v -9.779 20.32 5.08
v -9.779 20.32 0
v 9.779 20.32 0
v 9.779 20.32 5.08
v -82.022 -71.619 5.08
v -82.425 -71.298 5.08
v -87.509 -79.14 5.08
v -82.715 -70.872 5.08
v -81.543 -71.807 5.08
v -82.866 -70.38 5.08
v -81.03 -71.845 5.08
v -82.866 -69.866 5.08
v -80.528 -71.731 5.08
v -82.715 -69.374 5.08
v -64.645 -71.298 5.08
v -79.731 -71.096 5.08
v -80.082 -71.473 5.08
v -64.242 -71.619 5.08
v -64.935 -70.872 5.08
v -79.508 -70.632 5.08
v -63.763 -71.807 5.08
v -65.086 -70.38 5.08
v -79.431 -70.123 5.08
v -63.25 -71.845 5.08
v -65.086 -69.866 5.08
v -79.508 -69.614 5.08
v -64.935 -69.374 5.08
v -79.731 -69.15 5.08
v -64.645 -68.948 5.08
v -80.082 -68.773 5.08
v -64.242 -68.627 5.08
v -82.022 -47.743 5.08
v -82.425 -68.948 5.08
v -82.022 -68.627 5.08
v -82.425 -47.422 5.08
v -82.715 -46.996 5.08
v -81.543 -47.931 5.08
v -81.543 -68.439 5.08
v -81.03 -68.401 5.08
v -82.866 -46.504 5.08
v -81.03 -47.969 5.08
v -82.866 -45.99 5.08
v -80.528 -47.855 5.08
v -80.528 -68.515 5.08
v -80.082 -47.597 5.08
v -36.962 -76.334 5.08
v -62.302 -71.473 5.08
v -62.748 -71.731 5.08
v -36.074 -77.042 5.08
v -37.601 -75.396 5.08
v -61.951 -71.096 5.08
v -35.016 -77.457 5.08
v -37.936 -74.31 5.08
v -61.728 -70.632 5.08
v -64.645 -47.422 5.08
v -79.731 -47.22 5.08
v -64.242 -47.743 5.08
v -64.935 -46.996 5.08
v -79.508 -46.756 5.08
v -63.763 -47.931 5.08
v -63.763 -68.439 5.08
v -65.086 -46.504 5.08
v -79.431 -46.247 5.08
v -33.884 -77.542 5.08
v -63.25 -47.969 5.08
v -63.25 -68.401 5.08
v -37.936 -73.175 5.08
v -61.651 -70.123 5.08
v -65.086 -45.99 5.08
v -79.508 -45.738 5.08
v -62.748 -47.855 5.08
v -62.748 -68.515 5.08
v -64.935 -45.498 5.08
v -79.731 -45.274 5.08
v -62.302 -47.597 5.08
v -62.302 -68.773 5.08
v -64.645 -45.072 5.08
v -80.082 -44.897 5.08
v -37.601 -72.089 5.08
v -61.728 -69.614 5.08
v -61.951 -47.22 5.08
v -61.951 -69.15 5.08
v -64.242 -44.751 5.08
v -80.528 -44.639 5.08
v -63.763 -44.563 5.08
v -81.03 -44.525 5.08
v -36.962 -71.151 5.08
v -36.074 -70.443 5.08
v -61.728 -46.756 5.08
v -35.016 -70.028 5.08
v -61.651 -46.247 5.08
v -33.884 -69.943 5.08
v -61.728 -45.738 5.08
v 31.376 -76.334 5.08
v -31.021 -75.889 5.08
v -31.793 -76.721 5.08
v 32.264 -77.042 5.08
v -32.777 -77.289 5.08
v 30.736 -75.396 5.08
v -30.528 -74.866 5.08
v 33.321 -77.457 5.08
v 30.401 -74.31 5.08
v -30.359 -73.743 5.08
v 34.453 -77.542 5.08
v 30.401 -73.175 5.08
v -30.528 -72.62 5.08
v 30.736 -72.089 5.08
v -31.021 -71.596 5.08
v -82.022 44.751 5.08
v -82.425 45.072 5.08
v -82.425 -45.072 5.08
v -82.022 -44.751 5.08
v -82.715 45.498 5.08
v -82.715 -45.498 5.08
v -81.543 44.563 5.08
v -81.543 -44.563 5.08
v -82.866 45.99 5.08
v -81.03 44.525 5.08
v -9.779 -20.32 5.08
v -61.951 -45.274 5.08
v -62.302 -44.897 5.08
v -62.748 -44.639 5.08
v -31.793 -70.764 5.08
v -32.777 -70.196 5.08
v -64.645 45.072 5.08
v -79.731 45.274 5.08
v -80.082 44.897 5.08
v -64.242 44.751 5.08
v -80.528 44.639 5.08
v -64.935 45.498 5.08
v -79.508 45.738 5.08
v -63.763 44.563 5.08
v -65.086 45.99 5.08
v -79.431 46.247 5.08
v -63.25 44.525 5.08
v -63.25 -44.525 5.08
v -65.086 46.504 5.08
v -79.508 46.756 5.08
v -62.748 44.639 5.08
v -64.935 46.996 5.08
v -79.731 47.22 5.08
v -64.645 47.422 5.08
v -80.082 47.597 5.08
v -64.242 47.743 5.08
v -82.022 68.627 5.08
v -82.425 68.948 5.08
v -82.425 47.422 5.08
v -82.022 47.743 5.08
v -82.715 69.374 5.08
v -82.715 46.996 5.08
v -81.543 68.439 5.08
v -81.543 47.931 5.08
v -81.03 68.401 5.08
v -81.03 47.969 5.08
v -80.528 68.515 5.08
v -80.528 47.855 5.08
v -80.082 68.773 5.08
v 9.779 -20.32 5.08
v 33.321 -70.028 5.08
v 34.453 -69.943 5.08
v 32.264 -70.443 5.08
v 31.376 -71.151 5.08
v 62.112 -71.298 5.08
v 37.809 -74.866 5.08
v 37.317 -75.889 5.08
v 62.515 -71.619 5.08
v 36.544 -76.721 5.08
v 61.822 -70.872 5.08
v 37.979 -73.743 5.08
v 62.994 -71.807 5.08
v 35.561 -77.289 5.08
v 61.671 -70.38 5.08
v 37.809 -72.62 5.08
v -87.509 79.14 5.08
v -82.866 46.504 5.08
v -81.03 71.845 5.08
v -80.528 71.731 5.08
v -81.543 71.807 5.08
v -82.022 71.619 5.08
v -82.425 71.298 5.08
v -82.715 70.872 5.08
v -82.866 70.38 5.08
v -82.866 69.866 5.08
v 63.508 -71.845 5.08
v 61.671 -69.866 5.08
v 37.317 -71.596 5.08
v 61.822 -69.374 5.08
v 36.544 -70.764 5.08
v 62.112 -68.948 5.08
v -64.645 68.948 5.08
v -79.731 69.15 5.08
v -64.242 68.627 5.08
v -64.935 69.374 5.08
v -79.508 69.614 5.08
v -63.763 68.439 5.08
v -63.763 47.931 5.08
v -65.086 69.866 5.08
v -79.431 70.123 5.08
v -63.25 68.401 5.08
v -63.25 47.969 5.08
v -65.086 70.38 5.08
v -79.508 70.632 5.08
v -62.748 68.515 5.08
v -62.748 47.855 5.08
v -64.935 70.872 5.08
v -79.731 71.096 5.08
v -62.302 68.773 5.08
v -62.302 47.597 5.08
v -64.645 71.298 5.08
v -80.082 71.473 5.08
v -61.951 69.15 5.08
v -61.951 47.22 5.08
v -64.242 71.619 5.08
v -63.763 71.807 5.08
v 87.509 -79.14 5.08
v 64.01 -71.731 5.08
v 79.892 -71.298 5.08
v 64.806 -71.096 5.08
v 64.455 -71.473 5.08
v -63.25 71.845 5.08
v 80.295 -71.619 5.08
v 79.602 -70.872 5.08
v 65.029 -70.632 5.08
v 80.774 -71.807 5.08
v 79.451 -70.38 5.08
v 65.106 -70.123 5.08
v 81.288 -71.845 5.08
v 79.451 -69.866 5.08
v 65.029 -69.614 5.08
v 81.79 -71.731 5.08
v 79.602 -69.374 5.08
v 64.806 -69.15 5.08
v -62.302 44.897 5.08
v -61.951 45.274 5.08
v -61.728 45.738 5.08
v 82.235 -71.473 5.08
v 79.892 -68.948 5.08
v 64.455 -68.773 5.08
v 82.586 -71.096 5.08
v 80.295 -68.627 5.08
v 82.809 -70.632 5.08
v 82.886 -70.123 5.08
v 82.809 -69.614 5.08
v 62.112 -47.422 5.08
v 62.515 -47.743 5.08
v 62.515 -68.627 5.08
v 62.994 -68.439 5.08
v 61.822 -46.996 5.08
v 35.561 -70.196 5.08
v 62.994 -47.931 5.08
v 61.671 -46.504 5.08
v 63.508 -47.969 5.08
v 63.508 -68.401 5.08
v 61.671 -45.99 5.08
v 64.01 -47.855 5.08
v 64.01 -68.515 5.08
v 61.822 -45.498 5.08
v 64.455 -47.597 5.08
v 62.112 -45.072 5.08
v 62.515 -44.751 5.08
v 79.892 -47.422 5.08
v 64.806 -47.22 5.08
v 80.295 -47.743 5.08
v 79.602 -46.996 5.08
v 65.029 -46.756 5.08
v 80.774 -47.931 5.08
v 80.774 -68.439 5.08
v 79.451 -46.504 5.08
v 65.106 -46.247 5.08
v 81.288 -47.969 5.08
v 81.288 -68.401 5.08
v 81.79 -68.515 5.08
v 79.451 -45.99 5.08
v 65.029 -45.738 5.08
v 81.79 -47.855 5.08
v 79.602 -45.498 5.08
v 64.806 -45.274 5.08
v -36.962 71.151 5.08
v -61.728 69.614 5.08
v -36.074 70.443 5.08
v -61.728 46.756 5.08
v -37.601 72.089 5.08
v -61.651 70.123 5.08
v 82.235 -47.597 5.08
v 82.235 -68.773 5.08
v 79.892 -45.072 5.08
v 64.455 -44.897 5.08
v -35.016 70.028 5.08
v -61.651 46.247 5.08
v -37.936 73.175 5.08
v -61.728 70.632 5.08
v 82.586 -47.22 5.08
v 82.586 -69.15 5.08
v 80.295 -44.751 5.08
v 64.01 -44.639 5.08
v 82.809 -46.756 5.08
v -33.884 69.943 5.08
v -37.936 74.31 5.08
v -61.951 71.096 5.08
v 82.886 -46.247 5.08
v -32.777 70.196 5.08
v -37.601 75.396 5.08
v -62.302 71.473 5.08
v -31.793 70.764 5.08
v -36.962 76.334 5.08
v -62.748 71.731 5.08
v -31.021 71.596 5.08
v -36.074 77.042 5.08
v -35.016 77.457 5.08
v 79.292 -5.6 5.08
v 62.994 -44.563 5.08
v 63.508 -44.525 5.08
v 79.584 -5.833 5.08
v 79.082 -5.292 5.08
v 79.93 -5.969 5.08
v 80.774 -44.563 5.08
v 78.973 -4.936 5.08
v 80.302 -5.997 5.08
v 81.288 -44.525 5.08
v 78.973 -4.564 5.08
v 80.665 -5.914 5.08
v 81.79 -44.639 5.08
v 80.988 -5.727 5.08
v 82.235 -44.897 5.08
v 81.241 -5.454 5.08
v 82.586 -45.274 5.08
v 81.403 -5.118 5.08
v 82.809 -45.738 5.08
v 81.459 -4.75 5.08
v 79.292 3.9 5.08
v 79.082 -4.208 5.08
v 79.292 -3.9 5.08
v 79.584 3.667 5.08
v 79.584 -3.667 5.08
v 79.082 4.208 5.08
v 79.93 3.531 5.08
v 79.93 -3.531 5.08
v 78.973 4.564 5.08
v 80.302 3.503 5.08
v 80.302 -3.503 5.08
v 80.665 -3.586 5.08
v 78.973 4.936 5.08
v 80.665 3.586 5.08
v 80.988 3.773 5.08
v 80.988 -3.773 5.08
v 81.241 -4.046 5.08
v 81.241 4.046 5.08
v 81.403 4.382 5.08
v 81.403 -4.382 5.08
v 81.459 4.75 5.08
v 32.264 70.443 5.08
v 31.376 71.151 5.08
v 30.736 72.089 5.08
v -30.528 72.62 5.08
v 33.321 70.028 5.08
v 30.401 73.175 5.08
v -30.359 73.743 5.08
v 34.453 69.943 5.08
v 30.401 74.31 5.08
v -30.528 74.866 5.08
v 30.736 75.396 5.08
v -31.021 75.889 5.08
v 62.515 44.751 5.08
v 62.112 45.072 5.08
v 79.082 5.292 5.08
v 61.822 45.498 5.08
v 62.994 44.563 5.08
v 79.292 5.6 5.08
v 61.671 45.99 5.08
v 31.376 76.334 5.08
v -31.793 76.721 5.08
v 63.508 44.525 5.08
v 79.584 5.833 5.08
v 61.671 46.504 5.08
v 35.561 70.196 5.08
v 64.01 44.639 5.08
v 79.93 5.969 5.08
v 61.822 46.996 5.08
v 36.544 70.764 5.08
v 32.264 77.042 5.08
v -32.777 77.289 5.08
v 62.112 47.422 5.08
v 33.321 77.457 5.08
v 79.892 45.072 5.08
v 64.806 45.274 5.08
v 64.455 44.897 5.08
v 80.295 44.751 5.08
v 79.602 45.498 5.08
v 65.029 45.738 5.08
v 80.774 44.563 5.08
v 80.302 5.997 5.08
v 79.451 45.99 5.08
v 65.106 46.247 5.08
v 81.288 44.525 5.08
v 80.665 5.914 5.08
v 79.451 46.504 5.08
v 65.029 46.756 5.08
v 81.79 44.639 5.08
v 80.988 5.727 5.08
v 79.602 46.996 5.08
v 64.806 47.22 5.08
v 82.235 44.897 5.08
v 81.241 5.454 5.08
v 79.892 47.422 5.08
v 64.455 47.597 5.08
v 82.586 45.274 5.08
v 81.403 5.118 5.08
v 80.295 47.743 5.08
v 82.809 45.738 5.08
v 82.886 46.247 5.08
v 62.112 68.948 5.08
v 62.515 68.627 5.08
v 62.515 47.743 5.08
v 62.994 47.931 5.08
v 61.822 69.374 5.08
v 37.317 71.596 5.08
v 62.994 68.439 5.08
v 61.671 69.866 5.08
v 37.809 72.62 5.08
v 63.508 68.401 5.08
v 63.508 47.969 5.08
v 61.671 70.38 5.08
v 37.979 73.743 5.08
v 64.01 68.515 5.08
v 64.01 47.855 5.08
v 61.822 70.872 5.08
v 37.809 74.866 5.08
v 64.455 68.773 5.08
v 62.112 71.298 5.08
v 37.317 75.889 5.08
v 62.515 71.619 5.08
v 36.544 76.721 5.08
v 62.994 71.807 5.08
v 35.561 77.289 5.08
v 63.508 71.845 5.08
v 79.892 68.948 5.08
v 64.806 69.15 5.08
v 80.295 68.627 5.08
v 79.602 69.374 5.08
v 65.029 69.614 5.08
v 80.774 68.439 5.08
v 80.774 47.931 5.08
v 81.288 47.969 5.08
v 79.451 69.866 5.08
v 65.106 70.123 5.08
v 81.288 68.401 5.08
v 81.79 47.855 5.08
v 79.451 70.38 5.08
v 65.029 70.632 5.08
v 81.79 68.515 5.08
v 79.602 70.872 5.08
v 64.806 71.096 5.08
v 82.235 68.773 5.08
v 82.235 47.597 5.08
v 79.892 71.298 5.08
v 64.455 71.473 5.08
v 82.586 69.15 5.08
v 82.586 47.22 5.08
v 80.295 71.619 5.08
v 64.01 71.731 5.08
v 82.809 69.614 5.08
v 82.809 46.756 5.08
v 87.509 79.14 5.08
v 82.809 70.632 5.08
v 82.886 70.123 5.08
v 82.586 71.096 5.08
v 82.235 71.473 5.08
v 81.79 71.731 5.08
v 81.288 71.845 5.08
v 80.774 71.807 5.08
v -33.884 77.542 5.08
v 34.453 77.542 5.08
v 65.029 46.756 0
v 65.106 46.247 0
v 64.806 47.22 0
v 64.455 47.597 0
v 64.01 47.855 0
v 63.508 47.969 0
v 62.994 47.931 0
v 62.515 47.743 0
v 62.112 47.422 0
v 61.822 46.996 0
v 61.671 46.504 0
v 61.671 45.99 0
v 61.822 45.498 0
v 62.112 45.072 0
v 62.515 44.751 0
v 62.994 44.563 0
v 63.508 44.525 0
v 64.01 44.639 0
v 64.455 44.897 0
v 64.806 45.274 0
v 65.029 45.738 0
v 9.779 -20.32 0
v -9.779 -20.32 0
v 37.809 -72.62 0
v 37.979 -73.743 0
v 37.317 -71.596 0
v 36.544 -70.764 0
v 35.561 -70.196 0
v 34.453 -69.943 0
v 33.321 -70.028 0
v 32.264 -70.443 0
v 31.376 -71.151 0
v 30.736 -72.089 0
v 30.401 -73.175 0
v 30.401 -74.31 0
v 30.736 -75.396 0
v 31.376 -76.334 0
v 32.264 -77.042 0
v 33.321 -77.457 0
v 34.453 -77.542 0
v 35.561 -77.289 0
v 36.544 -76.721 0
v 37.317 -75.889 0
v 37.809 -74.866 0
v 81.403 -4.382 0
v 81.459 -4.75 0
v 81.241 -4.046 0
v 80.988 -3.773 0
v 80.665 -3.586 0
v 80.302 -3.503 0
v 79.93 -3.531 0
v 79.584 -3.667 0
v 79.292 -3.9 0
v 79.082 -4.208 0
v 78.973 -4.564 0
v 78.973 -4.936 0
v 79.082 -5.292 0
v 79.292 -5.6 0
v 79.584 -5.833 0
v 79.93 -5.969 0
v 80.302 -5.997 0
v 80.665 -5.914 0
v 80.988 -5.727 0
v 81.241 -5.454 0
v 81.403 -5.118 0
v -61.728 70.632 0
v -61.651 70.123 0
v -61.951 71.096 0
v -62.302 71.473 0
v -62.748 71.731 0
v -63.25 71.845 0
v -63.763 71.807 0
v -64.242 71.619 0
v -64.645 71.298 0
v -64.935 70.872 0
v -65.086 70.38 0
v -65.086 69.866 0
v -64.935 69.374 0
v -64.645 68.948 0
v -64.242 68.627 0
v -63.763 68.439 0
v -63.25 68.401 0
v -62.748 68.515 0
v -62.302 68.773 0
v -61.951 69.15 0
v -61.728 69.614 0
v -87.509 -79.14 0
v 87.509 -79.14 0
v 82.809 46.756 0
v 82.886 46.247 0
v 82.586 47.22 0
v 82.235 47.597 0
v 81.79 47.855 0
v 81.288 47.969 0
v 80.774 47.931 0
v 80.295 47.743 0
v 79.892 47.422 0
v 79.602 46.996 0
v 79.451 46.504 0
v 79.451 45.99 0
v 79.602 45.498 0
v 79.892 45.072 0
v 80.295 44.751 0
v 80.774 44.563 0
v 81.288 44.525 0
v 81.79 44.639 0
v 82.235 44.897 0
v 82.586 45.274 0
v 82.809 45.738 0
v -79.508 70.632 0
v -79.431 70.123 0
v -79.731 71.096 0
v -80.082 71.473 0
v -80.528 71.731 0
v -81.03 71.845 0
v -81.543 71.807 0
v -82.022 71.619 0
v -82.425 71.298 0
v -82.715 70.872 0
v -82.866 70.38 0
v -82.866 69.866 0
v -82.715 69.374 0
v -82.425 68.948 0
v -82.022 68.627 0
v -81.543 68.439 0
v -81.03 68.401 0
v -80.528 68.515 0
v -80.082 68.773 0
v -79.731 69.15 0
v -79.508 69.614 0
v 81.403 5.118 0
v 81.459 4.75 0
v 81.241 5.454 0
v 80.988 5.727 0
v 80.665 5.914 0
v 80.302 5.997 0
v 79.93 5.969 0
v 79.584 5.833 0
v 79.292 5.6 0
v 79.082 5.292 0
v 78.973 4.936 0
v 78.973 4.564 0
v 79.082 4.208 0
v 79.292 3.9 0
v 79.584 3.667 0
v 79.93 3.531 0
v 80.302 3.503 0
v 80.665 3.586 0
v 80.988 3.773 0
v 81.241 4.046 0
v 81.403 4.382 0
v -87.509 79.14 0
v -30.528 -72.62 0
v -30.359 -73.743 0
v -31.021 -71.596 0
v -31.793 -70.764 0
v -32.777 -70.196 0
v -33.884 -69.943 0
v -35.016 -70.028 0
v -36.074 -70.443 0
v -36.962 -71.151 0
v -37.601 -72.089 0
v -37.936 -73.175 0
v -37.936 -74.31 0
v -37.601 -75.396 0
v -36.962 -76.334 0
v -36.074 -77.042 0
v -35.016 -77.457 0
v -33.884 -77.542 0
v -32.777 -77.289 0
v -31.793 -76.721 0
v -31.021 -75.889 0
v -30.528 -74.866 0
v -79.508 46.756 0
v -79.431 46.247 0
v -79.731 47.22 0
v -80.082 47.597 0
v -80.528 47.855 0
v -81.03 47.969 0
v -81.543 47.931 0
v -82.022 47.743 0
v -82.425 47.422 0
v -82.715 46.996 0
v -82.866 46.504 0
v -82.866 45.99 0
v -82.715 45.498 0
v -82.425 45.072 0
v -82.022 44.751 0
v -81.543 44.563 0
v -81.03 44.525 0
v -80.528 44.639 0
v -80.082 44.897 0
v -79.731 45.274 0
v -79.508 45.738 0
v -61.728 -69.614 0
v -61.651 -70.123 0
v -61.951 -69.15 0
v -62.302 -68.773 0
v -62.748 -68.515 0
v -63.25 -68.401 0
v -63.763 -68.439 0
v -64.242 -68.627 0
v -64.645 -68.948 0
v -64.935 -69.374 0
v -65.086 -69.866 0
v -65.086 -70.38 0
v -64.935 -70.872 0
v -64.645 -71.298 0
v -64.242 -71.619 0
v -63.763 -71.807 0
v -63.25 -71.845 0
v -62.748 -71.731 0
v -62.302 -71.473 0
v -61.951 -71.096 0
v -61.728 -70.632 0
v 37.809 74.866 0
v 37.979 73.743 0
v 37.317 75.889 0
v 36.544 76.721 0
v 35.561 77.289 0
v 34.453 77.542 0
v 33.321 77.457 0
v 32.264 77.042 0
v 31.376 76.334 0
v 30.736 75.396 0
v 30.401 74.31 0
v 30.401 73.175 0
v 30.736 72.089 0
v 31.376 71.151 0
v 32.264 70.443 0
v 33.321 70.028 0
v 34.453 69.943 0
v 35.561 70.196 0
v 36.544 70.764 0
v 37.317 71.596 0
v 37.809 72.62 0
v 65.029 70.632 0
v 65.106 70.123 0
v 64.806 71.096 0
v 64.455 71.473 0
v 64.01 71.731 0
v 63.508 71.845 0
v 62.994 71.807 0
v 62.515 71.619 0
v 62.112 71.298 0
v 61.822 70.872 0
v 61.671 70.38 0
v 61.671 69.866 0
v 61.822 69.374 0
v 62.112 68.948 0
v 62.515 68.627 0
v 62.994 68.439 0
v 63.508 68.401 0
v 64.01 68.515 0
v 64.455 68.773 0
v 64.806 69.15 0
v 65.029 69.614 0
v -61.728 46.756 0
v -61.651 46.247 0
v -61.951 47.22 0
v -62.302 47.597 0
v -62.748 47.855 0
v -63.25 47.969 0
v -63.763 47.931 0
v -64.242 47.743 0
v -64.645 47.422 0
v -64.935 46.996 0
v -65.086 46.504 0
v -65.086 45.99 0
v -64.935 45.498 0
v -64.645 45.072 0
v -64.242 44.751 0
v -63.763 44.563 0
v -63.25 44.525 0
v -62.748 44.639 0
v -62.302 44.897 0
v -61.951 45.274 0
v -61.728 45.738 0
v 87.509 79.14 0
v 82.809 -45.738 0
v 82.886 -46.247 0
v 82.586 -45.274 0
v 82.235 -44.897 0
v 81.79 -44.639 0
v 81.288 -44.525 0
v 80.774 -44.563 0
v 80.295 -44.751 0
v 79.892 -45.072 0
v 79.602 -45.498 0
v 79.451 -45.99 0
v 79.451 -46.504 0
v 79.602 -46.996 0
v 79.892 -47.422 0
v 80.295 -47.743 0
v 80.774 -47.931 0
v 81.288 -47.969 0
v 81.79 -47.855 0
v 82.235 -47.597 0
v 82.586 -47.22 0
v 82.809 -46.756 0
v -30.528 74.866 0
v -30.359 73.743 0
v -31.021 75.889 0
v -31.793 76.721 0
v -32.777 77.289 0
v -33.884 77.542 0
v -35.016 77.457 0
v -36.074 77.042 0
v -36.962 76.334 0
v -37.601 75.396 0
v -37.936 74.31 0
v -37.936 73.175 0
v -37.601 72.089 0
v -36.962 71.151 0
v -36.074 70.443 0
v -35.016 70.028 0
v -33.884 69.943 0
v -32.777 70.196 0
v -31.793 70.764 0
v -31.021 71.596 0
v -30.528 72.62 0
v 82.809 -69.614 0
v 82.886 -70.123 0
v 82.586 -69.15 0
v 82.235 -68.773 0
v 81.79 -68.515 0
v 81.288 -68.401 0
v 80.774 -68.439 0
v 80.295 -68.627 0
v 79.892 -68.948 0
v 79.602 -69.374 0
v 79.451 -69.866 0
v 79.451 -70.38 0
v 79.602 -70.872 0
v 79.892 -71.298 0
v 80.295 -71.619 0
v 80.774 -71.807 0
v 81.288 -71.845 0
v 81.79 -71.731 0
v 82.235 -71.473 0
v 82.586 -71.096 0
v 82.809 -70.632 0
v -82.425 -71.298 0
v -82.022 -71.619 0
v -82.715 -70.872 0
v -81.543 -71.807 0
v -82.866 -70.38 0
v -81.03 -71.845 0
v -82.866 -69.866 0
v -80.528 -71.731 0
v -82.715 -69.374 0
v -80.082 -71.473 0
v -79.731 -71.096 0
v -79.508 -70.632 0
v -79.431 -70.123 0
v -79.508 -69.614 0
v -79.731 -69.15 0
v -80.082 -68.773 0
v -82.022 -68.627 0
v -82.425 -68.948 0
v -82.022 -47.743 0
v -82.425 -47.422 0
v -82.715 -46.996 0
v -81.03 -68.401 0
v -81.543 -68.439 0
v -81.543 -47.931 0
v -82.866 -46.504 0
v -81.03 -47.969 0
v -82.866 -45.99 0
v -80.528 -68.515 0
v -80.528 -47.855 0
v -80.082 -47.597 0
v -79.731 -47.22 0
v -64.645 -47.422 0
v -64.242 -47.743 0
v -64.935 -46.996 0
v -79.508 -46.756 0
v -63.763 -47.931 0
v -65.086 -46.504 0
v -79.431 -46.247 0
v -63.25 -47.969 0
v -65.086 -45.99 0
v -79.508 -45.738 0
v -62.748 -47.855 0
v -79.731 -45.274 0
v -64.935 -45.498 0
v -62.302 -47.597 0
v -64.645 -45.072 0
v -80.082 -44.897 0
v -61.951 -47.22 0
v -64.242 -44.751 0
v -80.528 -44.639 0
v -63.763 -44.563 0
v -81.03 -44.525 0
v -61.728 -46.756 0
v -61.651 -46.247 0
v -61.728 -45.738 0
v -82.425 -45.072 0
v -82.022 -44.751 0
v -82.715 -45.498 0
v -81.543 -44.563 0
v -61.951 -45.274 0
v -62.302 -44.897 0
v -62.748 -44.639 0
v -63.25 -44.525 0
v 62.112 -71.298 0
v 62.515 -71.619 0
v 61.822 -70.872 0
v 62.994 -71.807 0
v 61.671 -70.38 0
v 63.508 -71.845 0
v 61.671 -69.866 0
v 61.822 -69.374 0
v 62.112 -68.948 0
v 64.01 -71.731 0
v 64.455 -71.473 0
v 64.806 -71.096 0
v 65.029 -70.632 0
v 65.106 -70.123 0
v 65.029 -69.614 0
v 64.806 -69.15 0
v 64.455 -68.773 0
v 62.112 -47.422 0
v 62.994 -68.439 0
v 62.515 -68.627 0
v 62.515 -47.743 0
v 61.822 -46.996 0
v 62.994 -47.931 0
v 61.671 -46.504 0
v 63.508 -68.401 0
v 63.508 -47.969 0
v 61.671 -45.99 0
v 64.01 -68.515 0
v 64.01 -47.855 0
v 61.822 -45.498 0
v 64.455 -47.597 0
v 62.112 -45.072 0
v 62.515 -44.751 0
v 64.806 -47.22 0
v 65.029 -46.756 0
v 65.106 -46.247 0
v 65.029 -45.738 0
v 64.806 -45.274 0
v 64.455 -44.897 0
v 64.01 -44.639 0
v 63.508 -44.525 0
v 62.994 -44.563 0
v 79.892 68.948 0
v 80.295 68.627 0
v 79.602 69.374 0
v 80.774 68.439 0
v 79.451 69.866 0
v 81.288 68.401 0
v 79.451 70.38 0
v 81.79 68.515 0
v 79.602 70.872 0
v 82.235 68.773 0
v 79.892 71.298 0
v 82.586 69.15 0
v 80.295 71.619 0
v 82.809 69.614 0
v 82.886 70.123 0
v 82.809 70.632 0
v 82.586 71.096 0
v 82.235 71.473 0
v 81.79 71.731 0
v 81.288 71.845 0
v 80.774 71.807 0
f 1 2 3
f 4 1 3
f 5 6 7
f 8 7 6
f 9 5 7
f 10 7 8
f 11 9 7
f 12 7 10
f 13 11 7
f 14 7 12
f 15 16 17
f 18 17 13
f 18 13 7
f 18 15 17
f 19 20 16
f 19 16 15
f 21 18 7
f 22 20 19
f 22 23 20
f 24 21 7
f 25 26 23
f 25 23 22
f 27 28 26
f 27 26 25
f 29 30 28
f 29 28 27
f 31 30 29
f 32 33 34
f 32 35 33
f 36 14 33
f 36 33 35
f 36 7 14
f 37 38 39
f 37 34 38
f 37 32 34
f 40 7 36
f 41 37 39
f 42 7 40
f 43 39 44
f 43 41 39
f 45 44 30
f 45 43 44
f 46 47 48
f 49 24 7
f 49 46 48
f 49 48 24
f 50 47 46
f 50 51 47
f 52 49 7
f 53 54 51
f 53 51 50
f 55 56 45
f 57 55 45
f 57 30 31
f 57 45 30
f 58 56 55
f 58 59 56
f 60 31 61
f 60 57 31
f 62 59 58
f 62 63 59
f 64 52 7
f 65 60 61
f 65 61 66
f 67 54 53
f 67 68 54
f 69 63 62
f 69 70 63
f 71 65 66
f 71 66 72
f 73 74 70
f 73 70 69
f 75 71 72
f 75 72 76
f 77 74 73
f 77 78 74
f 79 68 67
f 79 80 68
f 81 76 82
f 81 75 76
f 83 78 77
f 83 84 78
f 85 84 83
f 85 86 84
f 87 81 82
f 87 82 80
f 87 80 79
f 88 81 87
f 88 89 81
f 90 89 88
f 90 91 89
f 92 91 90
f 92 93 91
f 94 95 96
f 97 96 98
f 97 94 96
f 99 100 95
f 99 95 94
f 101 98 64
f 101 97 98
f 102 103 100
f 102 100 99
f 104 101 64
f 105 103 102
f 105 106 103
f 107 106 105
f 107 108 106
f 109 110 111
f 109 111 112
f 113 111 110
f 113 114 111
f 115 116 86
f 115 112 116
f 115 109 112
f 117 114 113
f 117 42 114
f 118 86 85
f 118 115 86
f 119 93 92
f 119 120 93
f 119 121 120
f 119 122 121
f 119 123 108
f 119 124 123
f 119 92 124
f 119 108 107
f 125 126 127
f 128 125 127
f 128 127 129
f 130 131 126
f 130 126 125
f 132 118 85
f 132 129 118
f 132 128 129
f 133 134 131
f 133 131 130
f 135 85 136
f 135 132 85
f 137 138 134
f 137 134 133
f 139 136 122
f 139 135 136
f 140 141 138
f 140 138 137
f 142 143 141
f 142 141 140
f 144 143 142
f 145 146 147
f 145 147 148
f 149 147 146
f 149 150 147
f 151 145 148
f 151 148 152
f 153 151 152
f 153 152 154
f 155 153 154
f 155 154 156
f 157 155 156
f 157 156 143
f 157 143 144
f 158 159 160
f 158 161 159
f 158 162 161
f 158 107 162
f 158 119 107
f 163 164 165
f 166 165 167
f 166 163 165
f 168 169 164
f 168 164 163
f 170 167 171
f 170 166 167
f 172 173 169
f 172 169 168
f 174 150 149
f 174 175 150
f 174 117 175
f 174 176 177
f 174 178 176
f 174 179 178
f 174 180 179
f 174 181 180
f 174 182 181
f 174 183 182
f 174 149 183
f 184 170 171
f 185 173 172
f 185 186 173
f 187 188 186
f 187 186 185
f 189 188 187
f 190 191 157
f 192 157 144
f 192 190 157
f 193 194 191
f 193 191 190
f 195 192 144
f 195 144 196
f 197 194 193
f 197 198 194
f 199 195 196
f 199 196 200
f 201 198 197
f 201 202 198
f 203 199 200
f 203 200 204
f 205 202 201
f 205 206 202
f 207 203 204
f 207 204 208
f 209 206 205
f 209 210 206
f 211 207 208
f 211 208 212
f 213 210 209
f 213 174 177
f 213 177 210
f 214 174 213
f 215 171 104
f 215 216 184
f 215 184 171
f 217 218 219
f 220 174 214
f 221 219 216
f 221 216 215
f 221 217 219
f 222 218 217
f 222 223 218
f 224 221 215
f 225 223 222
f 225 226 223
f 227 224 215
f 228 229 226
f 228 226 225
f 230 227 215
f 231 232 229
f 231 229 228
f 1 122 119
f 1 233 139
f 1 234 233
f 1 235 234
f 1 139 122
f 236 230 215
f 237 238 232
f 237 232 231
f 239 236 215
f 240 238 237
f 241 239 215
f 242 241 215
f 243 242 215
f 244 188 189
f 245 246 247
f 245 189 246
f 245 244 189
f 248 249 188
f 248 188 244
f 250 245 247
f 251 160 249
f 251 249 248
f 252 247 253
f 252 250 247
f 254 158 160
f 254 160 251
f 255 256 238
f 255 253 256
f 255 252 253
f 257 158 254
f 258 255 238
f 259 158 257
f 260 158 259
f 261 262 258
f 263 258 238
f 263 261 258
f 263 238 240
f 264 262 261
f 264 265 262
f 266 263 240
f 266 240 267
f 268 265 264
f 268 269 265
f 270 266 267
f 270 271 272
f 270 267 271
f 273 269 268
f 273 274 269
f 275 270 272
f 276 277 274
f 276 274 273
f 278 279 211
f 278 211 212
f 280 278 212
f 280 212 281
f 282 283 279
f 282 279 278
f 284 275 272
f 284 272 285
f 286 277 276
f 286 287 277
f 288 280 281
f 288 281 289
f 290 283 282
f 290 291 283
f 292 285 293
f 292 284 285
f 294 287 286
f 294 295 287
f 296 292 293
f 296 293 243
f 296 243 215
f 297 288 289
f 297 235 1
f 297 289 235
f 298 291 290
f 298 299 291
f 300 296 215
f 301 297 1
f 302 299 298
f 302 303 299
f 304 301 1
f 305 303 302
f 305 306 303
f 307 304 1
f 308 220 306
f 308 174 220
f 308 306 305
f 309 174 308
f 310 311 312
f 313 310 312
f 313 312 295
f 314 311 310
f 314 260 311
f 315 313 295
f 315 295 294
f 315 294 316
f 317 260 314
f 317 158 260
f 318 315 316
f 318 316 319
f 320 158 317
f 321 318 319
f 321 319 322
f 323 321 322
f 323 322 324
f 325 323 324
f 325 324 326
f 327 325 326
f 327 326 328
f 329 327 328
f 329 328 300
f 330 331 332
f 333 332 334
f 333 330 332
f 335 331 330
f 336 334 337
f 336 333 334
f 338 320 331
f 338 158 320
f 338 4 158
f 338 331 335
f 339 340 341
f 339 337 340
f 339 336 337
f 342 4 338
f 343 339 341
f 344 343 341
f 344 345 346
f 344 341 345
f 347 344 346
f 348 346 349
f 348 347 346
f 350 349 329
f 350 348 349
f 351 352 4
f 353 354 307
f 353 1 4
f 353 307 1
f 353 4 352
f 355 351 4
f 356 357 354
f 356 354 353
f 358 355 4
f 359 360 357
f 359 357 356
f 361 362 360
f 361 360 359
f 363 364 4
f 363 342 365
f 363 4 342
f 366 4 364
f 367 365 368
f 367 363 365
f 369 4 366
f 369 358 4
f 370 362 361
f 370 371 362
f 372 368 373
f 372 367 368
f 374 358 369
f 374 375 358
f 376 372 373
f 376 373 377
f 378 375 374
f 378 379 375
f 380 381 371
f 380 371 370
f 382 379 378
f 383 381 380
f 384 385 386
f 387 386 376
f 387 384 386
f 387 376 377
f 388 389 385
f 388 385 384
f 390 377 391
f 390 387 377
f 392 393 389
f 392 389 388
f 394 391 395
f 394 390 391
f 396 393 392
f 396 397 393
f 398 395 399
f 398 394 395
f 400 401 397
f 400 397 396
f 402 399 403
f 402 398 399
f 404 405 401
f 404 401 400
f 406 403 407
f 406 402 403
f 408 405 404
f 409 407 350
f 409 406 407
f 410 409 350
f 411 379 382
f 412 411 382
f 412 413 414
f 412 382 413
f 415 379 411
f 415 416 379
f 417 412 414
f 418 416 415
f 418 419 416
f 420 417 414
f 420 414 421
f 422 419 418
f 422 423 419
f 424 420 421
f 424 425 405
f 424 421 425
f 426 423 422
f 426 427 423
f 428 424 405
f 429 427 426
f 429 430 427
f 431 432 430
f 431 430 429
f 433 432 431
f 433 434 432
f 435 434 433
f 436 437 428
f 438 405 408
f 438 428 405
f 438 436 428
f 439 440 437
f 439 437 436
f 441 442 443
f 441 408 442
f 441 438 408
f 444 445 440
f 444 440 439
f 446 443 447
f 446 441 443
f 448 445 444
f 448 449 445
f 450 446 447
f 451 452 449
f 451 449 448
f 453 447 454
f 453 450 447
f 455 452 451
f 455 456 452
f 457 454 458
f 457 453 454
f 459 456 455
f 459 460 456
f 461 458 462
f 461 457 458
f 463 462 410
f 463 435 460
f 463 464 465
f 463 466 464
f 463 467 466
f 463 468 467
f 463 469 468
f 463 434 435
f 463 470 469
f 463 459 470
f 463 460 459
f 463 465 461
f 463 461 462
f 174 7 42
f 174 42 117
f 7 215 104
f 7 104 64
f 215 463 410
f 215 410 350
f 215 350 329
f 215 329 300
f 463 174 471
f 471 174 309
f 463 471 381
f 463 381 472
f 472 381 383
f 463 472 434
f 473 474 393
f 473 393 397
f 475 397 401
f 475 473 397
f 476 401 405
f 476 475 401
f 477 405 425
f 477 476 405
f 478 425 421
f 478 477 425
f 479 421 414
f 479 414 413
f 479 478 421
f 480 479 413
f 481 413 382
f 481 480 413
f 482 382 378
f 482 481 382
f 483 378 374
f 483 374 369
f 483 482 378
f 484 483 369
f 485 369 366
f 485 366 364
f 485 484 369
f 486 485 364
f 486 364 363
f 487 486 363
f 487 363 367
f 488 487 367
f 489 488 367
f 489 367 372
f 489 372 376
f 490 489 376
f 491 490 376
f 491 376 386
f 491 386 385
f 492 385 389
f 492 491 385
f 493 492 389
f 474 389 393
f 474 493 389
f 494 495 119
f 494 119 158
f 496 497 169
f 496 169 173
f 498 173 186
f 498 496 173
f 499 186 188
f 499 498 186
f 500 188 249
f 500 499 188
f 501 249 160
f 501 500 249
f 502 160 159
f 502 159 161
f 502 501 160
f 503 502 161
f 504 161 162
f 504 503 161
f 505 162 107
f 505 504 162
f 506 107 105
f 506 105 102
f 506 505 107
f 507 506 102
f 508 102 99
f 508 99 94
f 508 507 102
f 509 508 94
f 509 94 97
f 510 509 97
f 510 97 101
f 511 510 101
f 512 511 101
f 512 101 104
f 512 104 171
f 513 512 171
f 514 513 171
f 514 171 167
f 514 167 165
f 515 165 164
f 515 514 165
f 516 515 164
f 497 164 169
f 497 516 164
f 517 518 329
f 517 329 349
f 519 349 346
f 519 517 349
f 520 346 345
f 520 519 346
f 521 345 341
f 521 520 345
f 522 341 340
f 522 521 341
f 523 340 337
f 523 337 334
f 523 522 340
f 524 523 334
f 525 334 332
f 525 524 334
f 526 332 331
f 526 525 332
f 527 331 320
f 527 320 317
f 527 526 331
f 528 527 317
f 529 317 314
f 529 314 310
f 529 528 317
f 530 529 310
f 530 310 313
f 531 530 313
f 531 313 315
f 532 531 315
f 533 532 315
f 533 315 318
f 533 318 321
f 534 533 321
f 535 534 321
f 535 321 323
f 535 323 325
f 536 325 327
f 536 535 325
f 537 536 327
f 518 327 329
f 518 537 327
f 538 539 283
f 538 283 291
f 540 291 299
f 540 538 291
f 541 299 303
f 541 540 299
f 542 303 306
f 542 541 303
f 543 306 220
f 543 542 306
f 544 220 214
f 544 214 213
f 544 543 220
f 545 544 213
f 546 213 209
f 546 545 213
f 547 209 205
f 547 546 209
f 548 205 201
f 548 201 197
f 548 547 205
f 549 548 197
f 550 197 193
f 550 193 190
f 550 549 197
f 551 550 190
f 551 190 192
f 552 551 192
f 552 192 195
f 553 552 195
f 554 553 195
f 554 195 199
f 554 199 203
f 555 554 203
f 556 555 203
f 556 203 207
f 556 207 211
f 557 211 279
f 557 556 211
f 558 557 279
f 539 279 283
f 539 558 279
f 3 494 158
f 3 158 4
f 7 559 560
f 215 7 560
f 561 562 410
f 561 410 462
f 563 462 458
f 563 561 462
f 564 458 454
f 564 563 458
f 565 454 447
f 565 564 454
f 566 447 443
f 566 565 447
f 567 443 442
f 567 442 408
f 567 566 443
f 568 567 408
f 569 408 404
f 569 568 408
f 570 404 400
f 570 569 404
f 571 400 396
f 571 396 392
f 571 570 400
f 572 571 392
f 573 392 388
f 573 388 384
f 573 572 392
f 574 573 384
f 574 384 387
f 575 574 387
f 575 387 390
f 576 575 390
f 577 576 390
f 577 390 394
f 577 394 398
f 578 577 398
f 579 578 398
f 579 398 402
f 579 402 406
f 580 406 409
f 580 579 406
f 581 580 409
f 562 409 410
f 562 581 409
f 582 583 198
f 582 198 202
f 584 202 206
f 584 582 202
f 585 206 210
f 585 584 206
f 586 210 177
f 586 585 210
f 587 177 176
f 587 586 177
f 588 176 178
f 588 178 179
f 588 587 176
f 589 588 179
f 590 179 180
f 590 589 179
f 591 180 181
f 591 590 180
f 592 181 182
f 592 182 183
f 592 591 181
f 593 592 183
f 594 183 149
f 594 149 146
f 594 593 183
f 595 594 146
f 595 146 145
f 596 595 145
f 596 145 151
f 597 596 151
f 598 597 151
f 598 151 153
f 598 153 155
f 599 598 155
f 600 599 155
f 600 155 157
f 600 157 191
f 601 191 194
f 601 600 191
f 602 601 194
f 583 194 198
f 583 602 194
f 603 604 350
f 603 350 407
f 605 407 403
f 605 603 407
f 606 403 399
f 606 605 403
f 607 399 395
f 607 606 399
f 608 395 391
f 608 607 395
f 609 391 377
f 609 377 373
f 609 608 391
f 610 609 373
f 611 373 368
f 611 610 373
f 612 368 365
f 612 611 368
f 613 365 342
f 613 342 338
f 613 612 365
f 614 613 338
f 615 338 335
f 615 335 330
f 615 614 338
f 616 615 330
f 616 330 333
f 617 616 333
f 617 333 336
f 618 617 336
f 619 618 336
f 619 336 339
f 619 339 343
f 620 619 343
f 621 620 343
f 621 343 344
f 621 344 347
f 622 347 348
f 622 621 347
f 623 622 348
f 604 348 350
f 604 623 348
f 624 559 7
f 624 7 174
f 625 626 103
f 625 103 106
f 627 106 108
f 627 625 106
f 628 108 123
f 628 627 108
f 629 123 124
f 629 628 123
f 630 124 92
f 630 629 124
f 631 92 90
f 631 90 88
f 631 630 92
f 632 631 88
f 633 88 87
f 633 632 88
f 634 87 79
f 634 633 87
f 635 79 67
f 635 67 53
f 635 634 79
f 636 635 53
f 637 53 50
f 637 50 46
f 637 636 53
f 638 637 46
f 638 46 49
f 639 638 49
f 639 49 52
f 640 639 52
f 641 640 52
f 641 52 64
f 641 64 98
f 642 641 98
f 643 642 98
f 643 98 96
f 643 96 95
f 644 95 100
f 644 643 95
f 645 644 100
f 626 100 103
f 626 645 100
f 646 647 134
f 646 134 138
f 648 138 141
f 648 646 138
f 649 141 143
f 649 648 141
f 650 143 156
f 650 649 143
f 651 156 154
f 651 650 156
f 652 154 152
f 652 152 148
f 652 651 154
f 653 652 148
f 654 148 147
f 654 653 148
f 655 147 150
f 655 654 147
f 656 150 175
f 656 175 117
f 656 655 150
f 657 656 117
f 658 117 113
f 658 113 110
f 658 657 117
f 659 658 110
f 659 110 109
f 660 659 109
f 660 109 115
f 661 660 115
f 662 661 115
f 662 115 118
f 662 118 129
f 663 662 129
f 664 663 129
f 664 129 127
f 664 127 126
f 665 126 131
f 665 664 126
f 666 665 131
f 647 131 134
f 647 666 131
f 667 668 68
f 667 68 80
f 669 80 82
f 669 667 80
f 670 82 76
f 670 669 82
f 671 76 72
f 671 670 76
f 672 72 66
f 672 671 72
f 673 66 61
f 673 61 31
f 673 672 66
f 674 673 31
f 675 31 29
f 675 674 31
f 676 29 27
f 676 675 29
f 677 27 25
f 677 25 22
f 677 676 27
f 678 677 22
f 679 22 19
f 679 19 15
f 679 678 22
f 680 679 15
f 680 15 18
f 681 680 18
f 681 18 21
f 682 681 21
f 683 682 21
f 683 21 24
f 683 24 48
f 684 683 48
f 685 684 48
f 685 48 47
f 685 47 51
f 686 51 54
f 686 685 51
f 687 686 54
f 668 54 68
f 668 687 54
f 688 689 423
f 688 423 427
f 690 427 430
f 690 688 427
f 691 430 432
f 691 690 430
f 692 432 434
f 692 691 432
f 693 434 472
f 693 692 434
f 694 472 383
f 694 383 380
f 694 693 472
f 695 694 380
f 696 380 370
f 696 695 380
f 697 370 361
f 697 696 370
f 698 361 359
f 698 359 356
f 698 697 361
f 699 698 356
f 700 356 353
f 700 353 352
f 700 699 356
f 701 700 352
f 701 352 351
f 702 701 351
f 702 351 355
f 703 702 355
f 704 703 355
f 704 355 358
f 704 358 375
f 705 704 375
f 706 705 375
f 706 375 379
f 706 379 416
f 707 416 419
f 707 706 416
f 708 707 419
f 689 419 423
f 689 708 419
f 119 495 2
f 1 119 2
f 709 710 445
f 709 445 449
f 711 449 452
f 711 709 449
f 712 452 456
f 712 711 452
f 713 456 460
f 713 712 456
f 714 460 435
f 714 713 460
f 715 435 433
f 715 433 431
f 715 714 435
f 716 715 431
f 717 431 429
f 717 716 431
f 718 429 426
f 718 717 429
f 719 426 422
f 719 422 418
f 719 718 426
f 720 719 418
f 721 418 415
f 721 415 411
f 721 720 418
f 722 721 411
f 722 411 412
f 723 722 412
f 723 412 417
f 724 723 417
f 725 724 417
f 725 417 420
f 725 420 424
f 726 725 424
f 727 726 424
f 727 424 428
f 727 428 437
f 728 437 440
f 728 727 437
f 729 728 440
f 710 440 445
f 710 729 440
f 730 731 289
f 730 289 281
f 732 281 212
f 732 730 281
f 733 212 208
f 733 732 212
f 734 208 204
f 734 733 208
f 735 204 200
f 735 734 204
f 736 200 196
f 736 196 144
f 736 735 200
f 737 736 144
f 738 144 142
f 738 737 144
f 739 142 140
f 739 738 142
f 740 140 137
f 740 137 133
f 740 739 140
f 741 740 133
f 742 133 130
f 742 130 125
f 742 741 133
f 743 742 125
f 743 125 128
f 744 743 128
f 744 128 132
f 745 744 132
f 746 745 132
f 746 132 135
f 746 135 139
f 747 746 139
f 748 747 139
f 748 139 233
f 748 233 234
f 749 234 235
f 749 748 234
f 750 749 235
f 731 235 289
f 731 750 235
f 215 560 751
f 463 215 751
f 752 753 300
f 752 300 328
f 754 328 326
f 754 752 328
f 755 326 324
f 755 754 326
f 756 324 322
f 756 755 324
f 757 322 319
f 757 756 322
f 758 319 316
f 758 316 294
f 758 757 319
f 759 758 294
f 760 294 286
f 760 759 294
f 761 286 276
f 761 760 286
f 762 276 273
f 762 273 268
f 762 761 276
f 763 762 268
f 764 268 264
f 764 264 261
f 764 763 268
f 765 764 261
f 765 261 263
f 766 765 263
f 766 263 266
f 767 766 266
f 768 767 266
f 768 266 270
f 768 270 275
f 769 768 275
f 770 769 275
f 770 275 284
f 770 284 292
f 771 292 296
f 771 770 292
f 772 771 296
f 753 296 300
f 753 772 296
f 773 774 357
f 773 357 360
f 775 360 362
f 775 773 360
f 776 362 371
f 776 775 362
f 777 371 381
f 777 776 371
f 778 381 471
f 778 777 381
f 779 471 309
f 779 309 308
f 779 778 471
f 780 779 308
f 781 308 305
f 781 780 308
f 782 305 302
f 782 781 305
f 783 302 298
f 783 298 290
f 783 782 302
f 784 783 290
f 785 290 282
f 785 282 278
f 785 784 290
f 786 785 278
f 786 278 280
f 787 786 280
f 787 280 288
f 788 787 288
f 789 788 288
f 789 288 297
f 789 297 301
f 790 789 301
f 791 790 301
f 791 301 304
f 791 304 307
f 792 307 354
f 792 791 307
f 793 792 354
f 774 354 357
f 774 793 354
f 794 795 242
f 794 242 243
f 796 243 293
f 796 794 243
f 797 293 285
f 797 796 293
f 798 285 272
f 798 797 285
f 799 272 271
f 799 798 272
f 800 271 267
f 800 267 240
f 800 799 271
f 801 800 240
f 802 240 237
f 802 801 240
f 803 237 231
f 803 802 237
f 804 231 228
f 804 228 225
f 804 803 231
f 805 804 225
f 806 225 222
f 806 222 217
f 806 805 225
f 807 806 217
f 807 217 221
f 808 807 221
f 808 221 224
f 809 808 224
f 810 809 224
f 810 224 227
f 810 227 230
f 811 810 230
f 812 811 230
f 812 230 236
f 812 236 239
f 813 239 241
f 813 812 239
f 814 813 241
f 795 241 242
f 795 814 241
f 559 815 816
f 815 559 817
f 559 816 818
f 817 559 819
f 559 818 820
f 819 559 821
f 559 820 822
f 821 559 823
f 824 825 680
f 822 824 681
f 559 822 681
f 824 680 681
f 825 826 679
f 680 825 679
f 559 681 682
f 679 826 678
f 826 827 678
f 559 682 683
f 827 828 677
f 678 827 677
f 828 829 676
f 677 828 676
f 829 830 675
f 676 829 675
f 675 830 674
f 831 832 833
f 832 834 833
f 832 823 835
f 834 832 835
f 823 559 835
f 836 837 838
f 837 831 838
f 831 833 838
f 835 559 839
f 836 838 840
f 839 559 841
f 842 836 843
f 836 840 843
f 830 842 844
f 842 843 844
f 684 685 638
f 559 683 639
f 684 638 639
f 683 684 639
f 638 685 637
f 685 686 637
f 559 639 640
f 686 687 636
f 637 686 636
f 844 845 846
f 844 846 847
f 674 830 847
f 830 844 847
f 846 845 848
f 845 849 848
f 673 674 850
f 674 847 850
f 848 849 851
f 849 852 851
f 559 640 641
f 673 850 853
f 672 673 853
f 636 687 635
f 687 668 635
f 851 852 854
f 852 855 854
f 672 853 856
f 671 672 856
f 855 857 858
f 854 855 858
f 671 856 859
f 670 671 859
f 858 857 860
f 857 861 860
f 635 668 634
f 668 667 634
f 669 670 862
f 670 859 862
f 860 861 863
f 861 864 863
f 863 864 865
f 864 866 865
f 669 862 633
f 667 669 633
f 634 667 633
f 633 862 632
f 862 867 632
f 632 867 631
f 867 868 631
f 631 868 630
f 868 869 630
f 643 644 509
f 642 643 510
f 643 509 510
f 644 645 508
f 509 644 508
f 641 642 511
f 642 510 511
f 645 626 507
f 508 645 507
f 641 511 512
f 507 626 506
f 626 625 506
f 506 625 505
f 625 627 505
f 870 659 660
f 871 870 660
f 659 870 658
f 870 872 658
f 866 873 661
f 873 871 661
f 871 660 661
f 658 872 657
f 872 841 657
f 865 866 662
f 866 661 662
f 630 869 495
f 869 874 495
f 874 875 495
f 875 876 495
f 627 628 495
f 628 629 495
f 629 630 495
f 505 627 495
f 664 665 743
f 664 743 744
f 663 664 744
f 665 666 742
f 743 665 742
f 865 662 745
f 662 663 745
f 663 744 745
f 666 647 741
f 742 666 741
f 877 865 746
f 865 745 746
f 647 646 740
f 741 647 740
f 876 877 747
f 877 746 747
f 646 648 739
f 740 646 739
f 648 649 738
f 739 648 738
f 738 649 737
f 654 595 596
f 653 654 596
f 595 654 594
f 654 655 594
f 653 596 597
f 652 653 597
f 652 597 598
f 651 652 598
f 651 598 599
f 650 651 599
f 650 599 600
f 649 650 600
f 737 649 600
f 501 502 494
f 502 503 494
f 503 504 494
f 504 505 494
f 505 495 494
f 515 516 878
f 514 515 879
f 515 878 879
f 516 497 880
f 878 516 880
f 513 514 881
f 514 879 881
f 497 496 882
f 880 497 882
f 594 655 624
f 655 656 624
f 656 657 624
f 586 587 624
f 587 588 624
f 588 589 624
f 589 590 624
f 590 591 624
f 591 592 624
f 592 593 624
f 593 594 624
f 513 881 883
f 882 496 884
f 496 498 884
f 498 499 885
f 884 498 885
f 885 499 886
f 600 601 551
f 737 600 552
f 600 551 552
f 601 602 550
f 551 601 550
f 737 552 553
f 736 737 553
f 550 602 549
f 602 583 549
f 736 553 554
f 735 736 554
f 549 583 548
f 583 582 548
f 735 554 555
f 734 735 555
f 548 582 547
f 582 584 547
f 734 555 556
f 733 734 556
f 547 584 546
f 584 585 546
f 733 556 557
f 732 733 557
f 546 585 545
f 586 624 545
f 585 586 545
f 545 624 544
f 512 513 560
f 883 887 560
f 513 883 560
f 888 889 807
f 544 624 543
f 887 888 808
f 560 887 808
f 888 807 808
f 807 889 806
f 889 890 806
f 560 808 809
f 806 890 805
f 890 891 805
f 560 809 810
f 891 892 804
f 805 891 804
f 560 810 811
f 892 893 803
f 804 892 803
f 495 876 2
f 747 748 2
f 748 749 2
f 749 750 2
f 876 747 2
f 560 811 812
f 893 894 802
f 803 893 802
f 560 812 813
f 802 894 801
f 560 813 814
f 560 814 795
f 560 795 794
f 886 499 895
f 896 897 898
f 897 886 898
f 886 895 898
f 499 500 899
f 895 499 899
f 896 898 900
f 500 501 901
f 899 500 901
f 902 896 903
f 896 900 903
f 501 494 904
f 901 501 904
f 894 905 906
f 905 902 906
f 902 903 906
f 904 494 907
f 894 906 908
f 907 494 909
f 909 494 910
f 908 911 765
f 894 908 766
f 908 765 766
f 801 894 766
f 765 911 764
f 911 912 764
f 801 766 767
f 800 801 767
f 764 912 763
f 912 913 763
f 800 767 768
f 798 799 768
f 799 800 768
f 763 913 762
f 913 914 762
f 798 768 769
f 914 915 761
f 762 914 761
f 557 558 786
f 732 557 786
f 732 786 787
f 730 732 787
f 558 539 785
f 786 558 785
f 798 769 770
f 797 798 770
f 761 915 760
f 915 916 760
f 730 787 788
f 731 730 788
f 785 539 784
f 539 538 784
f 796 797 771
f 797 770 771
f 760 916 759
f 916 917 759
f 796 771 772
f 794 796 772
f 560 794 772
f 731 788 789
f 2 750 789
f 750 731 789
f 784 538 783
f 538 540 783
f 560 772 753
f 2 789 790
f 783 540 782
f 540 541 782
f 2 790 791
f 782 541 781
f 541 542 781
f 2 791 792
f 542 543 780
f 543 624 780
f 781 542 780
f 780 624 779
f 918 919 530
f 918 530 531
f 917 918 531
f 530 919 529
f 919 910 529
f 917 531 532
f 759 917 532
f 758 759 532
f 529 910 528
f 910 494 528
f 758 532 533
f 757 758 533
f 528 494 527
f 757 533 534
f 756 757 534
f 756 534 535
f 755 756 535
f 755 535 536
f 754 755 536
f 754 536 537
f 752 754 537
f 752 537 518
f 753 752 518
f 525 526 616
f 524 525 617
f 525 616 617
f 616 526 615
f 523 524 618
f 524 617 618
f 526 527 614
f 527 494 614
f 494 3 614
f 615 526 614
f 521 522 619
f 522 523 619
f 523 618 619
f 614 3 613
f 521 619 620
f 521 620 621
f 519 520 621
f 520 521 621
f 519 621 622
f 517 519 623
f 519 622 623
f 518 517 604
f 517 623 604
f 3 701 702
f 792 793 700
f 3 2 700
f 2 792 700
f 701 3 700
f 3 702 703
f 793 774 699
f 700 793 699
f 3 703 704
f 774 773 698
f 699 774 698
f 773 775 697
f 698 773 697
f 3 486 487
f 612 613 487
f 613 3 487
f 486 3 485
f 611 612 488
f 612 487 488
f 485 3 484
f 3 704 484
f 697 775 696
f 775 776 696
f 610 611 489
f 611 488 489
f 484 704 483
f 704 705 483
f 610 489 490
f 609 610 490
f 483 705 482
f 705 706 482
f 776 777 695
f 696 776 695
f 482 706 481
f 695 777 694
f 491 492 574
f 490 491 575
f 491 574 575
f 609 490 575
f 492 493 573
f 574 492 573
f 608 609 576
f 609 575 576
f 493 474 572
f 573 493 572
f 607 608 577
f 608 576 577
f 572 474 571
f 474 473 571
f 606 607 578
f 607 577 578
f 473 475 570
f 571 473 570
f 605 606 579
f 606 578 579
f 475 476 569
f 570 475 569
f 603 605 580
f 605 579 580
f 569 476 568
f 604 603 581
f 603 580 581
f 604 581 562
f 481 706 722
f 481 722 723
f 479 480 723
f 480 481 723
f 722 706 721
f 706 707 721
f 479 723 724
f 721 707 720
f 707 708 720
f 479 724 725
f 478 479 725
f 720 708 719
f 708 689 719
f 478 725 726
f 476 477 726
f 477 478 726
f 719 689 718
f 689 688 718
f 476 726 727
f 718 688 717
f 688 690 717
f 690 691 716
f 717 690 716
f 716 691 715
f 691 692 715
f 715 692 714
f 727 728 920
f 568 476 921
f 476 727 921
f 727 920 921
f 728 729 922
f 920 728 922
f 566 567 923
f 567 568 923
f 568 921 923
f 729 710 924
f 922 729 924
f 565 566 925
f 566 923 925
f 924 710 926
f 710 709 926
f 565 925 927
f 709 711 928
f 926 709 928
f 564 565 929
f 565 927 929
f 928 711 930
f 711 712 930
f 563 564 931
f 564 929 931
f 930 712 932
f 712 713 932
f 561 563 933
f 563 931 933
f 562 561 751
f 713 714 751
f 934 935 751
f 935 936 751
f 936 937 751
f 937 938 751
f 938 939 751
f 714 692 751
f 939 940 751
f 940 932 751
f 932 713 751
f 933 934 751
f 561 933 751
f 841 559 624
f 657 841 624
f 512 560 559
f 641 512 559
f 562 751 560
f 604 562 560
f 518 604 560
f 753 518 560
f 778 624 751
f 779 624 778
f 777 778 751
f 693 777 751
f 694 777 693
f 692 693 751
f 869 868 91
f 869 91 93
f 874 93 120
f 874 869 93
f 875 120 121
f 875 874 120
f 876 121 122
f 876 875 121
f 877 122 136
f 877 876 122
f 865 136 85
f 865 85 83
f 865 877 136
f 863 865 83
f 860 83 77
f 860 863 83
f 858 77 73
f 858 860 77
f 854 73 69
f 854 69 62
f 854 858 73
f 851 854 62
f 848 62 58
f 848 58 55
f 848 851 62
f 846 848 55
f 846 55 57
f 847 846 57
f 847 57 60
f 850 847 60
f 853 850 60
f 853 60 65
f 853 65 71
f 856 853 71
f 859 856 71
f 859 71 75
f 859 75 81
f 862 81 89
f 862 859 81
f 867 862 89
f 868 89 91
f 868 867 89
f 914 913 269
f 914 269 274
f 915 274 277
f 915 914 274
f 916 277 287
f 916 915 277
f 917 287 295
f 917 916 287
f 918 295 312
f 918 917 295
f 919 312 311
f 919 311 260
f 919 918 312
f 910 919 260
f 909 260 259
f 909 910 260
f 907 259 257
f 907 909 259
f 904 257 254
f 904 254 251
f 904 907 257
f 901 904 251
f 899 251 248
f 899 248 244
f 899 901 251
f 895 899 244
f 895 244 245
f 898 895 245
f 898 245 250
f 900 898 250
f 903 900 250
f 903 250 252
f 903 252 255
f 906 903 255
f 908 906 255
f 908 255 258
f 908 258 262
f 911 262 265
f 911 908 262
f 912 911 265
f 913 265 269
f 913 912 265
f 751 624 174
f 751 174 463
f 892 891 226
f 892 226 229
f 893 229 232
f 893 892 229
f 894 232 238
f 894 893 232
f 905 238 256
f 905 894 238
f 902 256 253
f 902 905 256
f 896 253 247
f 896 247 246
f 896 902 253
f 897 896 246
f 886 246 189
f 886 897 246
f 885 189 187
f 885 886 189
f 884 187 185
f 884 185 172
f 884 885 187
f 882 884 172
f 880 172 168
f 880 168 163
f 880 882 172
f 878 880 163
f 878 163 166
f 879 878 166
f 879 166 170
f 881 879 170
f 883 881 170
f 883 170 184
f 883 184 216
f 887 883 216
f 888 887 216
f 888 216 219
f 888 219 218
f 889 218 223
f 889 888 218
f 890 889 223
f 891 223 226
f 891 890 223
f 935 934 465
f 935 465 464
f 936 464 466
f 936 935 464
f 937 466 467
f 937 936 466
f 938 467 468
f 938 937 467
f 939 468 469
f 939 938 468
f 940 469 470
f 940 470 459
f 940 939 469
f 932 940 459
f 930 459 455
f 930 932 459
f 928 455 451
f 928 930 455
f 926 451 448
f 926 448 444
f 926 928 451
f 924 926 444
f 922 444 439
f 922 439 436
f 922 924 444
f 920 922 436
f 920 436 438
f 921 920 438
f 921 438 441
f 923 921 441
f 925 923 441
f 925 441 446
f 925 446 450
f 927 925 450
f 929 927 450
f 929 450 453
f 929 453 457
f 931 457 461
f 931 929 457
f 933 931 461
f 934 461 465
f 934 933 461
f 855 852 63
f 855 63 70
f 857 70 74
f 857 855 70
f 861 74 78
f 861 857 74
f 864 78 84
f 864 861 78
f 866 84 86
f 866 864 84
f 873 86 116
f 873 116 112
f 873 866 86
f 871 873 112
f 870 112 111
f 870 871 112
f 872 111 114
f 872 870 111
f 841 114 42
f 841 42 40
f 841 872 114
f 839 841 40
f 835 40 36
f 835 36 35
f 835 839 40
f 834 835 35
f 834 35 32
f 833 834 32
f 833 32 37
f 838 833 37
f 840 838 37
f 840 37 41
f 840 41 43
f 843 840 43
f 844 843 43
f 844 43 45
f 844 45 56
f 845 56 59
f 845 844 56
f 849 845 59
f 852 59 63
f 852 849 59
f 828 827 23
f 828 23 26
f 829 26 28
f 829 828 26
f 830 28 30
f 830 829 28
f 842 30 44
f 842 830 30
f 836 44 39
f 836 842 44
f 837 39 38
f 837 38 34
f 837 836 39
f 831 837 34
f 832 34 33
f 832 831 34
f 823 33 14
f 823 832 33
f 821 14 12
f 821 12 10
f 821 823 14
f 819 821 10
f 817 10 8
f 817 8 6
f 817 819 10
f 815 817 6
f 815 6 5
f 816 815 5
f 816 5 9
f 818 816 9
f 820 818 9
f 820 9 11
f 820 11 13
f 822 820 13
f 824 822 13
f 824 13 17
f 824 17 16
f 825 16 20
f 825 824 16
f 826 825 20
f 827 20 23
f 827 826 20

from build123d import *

# Parameters (mm, degrees)
F0_W     = 175.01715
F0_H     = 158.2801
F0_R     = 1.7272
F0_R_2   = 3.81
F0_R_3   = 1.25
F0_W_2   = 19.558
F0_H_2   = 40.64
F1_DEPTH = 5.08


with BuildPart() as f1:
    # F0 (on Top) → F1 (new body)
    with BuildSketch(Plane.XY):
        Rectangle(F0_W, F0_H)
        with Locations((-81.158575, -70.12305)):
            Circle(F0_R, mode=Mode.SUBTRACT)
        with Locations((-63.378575, -70.12305)):
            Circle(F0_R, mode=Mode.SUBTRACT)
        with Locations((-81.158575, -46.24705)):
            Circle(F0_R, mode=Mode.SUBTRACT)
        with Locations((-63.378575, -46.24705)):
            Circle(F0_R, mode=Mode.SUBTRACT)
        with Locations((-34.168575, -73.74255)):
            Circle(F0_R_2, mode=Mode.SUBTRACT)
        with Locations((34.168575, -73.74255)):
            Circle(F0_R_2, mode=Mode.SUBTRACT)
        with Locations((63.378575, -70.12305)):
            Circle(F0_R, mode=Mode.SUBTRACT)
        with Locations((81.158575, -70.12305)):
            Circle(F0_R, mode=Mode.SUBTRACT)
        with Locations((63.378575, -46.24705)):
            Circle(F0_R, mode=Mode.SUBTRACT)
        with Locations((81.158575, -46.24705)):
            Circle(F0_R, mode=Mode.SUBTRACT)
        with Locations((80.208564, -4.750003)):
            Circle(F0_R_3, mode=Mode.SUBTRACT)
        with Locations((-81.158575, 46.24705)):
            Circle(F0_R, mode=Mode.SUBTRACT)
        with Locations((-63.378575, 46.24705)):
            Circle(F0_R, mode=Mode.SUBTRACT)
        with Locations((-81.158575, 70.12305)):
            Circle(F0_R, mode=Mode.SUBTRACT)
        with Locations((-63.378575, 70.12305)):
            Circle(F0_R, mode=Mode.SUBTRACT)
        with Locations((-34.168575, 73.74255)):
            Circle(F0_R_2, mode=Mode.SUBTRACT)
        Rectangle(F0_W_2, F0_H_2, mode=Mode.SUBTRACT)
        with Locations((80.208564, 4.750003)):
            Circle(F0_R_3, mode=Mode.SUBTRACT)
        with Locations((34.168575, 73.74255)):
            Circle(F0_R_2, mode=Mode.SUBTRACT)
        with Locations((63.378575, 46.24705)):
            Circle(F0_R, mode=Mode.SUBTRACT)
        with Locations((81.158575, 46.24705)):
            Circle(F0_R, mode=Mode.SUBTRACT)
        with Locations((63.378575, 70.12305)):
            Circle(F0_R, mode=Mode.SUBTRACT)
        with Locations((81.158575, 70.12305)):
            Circle(F0_R, mode=Mode.SUBTRACT)
    extrude(amount=F1_DEPTH)


solid = f1.part
